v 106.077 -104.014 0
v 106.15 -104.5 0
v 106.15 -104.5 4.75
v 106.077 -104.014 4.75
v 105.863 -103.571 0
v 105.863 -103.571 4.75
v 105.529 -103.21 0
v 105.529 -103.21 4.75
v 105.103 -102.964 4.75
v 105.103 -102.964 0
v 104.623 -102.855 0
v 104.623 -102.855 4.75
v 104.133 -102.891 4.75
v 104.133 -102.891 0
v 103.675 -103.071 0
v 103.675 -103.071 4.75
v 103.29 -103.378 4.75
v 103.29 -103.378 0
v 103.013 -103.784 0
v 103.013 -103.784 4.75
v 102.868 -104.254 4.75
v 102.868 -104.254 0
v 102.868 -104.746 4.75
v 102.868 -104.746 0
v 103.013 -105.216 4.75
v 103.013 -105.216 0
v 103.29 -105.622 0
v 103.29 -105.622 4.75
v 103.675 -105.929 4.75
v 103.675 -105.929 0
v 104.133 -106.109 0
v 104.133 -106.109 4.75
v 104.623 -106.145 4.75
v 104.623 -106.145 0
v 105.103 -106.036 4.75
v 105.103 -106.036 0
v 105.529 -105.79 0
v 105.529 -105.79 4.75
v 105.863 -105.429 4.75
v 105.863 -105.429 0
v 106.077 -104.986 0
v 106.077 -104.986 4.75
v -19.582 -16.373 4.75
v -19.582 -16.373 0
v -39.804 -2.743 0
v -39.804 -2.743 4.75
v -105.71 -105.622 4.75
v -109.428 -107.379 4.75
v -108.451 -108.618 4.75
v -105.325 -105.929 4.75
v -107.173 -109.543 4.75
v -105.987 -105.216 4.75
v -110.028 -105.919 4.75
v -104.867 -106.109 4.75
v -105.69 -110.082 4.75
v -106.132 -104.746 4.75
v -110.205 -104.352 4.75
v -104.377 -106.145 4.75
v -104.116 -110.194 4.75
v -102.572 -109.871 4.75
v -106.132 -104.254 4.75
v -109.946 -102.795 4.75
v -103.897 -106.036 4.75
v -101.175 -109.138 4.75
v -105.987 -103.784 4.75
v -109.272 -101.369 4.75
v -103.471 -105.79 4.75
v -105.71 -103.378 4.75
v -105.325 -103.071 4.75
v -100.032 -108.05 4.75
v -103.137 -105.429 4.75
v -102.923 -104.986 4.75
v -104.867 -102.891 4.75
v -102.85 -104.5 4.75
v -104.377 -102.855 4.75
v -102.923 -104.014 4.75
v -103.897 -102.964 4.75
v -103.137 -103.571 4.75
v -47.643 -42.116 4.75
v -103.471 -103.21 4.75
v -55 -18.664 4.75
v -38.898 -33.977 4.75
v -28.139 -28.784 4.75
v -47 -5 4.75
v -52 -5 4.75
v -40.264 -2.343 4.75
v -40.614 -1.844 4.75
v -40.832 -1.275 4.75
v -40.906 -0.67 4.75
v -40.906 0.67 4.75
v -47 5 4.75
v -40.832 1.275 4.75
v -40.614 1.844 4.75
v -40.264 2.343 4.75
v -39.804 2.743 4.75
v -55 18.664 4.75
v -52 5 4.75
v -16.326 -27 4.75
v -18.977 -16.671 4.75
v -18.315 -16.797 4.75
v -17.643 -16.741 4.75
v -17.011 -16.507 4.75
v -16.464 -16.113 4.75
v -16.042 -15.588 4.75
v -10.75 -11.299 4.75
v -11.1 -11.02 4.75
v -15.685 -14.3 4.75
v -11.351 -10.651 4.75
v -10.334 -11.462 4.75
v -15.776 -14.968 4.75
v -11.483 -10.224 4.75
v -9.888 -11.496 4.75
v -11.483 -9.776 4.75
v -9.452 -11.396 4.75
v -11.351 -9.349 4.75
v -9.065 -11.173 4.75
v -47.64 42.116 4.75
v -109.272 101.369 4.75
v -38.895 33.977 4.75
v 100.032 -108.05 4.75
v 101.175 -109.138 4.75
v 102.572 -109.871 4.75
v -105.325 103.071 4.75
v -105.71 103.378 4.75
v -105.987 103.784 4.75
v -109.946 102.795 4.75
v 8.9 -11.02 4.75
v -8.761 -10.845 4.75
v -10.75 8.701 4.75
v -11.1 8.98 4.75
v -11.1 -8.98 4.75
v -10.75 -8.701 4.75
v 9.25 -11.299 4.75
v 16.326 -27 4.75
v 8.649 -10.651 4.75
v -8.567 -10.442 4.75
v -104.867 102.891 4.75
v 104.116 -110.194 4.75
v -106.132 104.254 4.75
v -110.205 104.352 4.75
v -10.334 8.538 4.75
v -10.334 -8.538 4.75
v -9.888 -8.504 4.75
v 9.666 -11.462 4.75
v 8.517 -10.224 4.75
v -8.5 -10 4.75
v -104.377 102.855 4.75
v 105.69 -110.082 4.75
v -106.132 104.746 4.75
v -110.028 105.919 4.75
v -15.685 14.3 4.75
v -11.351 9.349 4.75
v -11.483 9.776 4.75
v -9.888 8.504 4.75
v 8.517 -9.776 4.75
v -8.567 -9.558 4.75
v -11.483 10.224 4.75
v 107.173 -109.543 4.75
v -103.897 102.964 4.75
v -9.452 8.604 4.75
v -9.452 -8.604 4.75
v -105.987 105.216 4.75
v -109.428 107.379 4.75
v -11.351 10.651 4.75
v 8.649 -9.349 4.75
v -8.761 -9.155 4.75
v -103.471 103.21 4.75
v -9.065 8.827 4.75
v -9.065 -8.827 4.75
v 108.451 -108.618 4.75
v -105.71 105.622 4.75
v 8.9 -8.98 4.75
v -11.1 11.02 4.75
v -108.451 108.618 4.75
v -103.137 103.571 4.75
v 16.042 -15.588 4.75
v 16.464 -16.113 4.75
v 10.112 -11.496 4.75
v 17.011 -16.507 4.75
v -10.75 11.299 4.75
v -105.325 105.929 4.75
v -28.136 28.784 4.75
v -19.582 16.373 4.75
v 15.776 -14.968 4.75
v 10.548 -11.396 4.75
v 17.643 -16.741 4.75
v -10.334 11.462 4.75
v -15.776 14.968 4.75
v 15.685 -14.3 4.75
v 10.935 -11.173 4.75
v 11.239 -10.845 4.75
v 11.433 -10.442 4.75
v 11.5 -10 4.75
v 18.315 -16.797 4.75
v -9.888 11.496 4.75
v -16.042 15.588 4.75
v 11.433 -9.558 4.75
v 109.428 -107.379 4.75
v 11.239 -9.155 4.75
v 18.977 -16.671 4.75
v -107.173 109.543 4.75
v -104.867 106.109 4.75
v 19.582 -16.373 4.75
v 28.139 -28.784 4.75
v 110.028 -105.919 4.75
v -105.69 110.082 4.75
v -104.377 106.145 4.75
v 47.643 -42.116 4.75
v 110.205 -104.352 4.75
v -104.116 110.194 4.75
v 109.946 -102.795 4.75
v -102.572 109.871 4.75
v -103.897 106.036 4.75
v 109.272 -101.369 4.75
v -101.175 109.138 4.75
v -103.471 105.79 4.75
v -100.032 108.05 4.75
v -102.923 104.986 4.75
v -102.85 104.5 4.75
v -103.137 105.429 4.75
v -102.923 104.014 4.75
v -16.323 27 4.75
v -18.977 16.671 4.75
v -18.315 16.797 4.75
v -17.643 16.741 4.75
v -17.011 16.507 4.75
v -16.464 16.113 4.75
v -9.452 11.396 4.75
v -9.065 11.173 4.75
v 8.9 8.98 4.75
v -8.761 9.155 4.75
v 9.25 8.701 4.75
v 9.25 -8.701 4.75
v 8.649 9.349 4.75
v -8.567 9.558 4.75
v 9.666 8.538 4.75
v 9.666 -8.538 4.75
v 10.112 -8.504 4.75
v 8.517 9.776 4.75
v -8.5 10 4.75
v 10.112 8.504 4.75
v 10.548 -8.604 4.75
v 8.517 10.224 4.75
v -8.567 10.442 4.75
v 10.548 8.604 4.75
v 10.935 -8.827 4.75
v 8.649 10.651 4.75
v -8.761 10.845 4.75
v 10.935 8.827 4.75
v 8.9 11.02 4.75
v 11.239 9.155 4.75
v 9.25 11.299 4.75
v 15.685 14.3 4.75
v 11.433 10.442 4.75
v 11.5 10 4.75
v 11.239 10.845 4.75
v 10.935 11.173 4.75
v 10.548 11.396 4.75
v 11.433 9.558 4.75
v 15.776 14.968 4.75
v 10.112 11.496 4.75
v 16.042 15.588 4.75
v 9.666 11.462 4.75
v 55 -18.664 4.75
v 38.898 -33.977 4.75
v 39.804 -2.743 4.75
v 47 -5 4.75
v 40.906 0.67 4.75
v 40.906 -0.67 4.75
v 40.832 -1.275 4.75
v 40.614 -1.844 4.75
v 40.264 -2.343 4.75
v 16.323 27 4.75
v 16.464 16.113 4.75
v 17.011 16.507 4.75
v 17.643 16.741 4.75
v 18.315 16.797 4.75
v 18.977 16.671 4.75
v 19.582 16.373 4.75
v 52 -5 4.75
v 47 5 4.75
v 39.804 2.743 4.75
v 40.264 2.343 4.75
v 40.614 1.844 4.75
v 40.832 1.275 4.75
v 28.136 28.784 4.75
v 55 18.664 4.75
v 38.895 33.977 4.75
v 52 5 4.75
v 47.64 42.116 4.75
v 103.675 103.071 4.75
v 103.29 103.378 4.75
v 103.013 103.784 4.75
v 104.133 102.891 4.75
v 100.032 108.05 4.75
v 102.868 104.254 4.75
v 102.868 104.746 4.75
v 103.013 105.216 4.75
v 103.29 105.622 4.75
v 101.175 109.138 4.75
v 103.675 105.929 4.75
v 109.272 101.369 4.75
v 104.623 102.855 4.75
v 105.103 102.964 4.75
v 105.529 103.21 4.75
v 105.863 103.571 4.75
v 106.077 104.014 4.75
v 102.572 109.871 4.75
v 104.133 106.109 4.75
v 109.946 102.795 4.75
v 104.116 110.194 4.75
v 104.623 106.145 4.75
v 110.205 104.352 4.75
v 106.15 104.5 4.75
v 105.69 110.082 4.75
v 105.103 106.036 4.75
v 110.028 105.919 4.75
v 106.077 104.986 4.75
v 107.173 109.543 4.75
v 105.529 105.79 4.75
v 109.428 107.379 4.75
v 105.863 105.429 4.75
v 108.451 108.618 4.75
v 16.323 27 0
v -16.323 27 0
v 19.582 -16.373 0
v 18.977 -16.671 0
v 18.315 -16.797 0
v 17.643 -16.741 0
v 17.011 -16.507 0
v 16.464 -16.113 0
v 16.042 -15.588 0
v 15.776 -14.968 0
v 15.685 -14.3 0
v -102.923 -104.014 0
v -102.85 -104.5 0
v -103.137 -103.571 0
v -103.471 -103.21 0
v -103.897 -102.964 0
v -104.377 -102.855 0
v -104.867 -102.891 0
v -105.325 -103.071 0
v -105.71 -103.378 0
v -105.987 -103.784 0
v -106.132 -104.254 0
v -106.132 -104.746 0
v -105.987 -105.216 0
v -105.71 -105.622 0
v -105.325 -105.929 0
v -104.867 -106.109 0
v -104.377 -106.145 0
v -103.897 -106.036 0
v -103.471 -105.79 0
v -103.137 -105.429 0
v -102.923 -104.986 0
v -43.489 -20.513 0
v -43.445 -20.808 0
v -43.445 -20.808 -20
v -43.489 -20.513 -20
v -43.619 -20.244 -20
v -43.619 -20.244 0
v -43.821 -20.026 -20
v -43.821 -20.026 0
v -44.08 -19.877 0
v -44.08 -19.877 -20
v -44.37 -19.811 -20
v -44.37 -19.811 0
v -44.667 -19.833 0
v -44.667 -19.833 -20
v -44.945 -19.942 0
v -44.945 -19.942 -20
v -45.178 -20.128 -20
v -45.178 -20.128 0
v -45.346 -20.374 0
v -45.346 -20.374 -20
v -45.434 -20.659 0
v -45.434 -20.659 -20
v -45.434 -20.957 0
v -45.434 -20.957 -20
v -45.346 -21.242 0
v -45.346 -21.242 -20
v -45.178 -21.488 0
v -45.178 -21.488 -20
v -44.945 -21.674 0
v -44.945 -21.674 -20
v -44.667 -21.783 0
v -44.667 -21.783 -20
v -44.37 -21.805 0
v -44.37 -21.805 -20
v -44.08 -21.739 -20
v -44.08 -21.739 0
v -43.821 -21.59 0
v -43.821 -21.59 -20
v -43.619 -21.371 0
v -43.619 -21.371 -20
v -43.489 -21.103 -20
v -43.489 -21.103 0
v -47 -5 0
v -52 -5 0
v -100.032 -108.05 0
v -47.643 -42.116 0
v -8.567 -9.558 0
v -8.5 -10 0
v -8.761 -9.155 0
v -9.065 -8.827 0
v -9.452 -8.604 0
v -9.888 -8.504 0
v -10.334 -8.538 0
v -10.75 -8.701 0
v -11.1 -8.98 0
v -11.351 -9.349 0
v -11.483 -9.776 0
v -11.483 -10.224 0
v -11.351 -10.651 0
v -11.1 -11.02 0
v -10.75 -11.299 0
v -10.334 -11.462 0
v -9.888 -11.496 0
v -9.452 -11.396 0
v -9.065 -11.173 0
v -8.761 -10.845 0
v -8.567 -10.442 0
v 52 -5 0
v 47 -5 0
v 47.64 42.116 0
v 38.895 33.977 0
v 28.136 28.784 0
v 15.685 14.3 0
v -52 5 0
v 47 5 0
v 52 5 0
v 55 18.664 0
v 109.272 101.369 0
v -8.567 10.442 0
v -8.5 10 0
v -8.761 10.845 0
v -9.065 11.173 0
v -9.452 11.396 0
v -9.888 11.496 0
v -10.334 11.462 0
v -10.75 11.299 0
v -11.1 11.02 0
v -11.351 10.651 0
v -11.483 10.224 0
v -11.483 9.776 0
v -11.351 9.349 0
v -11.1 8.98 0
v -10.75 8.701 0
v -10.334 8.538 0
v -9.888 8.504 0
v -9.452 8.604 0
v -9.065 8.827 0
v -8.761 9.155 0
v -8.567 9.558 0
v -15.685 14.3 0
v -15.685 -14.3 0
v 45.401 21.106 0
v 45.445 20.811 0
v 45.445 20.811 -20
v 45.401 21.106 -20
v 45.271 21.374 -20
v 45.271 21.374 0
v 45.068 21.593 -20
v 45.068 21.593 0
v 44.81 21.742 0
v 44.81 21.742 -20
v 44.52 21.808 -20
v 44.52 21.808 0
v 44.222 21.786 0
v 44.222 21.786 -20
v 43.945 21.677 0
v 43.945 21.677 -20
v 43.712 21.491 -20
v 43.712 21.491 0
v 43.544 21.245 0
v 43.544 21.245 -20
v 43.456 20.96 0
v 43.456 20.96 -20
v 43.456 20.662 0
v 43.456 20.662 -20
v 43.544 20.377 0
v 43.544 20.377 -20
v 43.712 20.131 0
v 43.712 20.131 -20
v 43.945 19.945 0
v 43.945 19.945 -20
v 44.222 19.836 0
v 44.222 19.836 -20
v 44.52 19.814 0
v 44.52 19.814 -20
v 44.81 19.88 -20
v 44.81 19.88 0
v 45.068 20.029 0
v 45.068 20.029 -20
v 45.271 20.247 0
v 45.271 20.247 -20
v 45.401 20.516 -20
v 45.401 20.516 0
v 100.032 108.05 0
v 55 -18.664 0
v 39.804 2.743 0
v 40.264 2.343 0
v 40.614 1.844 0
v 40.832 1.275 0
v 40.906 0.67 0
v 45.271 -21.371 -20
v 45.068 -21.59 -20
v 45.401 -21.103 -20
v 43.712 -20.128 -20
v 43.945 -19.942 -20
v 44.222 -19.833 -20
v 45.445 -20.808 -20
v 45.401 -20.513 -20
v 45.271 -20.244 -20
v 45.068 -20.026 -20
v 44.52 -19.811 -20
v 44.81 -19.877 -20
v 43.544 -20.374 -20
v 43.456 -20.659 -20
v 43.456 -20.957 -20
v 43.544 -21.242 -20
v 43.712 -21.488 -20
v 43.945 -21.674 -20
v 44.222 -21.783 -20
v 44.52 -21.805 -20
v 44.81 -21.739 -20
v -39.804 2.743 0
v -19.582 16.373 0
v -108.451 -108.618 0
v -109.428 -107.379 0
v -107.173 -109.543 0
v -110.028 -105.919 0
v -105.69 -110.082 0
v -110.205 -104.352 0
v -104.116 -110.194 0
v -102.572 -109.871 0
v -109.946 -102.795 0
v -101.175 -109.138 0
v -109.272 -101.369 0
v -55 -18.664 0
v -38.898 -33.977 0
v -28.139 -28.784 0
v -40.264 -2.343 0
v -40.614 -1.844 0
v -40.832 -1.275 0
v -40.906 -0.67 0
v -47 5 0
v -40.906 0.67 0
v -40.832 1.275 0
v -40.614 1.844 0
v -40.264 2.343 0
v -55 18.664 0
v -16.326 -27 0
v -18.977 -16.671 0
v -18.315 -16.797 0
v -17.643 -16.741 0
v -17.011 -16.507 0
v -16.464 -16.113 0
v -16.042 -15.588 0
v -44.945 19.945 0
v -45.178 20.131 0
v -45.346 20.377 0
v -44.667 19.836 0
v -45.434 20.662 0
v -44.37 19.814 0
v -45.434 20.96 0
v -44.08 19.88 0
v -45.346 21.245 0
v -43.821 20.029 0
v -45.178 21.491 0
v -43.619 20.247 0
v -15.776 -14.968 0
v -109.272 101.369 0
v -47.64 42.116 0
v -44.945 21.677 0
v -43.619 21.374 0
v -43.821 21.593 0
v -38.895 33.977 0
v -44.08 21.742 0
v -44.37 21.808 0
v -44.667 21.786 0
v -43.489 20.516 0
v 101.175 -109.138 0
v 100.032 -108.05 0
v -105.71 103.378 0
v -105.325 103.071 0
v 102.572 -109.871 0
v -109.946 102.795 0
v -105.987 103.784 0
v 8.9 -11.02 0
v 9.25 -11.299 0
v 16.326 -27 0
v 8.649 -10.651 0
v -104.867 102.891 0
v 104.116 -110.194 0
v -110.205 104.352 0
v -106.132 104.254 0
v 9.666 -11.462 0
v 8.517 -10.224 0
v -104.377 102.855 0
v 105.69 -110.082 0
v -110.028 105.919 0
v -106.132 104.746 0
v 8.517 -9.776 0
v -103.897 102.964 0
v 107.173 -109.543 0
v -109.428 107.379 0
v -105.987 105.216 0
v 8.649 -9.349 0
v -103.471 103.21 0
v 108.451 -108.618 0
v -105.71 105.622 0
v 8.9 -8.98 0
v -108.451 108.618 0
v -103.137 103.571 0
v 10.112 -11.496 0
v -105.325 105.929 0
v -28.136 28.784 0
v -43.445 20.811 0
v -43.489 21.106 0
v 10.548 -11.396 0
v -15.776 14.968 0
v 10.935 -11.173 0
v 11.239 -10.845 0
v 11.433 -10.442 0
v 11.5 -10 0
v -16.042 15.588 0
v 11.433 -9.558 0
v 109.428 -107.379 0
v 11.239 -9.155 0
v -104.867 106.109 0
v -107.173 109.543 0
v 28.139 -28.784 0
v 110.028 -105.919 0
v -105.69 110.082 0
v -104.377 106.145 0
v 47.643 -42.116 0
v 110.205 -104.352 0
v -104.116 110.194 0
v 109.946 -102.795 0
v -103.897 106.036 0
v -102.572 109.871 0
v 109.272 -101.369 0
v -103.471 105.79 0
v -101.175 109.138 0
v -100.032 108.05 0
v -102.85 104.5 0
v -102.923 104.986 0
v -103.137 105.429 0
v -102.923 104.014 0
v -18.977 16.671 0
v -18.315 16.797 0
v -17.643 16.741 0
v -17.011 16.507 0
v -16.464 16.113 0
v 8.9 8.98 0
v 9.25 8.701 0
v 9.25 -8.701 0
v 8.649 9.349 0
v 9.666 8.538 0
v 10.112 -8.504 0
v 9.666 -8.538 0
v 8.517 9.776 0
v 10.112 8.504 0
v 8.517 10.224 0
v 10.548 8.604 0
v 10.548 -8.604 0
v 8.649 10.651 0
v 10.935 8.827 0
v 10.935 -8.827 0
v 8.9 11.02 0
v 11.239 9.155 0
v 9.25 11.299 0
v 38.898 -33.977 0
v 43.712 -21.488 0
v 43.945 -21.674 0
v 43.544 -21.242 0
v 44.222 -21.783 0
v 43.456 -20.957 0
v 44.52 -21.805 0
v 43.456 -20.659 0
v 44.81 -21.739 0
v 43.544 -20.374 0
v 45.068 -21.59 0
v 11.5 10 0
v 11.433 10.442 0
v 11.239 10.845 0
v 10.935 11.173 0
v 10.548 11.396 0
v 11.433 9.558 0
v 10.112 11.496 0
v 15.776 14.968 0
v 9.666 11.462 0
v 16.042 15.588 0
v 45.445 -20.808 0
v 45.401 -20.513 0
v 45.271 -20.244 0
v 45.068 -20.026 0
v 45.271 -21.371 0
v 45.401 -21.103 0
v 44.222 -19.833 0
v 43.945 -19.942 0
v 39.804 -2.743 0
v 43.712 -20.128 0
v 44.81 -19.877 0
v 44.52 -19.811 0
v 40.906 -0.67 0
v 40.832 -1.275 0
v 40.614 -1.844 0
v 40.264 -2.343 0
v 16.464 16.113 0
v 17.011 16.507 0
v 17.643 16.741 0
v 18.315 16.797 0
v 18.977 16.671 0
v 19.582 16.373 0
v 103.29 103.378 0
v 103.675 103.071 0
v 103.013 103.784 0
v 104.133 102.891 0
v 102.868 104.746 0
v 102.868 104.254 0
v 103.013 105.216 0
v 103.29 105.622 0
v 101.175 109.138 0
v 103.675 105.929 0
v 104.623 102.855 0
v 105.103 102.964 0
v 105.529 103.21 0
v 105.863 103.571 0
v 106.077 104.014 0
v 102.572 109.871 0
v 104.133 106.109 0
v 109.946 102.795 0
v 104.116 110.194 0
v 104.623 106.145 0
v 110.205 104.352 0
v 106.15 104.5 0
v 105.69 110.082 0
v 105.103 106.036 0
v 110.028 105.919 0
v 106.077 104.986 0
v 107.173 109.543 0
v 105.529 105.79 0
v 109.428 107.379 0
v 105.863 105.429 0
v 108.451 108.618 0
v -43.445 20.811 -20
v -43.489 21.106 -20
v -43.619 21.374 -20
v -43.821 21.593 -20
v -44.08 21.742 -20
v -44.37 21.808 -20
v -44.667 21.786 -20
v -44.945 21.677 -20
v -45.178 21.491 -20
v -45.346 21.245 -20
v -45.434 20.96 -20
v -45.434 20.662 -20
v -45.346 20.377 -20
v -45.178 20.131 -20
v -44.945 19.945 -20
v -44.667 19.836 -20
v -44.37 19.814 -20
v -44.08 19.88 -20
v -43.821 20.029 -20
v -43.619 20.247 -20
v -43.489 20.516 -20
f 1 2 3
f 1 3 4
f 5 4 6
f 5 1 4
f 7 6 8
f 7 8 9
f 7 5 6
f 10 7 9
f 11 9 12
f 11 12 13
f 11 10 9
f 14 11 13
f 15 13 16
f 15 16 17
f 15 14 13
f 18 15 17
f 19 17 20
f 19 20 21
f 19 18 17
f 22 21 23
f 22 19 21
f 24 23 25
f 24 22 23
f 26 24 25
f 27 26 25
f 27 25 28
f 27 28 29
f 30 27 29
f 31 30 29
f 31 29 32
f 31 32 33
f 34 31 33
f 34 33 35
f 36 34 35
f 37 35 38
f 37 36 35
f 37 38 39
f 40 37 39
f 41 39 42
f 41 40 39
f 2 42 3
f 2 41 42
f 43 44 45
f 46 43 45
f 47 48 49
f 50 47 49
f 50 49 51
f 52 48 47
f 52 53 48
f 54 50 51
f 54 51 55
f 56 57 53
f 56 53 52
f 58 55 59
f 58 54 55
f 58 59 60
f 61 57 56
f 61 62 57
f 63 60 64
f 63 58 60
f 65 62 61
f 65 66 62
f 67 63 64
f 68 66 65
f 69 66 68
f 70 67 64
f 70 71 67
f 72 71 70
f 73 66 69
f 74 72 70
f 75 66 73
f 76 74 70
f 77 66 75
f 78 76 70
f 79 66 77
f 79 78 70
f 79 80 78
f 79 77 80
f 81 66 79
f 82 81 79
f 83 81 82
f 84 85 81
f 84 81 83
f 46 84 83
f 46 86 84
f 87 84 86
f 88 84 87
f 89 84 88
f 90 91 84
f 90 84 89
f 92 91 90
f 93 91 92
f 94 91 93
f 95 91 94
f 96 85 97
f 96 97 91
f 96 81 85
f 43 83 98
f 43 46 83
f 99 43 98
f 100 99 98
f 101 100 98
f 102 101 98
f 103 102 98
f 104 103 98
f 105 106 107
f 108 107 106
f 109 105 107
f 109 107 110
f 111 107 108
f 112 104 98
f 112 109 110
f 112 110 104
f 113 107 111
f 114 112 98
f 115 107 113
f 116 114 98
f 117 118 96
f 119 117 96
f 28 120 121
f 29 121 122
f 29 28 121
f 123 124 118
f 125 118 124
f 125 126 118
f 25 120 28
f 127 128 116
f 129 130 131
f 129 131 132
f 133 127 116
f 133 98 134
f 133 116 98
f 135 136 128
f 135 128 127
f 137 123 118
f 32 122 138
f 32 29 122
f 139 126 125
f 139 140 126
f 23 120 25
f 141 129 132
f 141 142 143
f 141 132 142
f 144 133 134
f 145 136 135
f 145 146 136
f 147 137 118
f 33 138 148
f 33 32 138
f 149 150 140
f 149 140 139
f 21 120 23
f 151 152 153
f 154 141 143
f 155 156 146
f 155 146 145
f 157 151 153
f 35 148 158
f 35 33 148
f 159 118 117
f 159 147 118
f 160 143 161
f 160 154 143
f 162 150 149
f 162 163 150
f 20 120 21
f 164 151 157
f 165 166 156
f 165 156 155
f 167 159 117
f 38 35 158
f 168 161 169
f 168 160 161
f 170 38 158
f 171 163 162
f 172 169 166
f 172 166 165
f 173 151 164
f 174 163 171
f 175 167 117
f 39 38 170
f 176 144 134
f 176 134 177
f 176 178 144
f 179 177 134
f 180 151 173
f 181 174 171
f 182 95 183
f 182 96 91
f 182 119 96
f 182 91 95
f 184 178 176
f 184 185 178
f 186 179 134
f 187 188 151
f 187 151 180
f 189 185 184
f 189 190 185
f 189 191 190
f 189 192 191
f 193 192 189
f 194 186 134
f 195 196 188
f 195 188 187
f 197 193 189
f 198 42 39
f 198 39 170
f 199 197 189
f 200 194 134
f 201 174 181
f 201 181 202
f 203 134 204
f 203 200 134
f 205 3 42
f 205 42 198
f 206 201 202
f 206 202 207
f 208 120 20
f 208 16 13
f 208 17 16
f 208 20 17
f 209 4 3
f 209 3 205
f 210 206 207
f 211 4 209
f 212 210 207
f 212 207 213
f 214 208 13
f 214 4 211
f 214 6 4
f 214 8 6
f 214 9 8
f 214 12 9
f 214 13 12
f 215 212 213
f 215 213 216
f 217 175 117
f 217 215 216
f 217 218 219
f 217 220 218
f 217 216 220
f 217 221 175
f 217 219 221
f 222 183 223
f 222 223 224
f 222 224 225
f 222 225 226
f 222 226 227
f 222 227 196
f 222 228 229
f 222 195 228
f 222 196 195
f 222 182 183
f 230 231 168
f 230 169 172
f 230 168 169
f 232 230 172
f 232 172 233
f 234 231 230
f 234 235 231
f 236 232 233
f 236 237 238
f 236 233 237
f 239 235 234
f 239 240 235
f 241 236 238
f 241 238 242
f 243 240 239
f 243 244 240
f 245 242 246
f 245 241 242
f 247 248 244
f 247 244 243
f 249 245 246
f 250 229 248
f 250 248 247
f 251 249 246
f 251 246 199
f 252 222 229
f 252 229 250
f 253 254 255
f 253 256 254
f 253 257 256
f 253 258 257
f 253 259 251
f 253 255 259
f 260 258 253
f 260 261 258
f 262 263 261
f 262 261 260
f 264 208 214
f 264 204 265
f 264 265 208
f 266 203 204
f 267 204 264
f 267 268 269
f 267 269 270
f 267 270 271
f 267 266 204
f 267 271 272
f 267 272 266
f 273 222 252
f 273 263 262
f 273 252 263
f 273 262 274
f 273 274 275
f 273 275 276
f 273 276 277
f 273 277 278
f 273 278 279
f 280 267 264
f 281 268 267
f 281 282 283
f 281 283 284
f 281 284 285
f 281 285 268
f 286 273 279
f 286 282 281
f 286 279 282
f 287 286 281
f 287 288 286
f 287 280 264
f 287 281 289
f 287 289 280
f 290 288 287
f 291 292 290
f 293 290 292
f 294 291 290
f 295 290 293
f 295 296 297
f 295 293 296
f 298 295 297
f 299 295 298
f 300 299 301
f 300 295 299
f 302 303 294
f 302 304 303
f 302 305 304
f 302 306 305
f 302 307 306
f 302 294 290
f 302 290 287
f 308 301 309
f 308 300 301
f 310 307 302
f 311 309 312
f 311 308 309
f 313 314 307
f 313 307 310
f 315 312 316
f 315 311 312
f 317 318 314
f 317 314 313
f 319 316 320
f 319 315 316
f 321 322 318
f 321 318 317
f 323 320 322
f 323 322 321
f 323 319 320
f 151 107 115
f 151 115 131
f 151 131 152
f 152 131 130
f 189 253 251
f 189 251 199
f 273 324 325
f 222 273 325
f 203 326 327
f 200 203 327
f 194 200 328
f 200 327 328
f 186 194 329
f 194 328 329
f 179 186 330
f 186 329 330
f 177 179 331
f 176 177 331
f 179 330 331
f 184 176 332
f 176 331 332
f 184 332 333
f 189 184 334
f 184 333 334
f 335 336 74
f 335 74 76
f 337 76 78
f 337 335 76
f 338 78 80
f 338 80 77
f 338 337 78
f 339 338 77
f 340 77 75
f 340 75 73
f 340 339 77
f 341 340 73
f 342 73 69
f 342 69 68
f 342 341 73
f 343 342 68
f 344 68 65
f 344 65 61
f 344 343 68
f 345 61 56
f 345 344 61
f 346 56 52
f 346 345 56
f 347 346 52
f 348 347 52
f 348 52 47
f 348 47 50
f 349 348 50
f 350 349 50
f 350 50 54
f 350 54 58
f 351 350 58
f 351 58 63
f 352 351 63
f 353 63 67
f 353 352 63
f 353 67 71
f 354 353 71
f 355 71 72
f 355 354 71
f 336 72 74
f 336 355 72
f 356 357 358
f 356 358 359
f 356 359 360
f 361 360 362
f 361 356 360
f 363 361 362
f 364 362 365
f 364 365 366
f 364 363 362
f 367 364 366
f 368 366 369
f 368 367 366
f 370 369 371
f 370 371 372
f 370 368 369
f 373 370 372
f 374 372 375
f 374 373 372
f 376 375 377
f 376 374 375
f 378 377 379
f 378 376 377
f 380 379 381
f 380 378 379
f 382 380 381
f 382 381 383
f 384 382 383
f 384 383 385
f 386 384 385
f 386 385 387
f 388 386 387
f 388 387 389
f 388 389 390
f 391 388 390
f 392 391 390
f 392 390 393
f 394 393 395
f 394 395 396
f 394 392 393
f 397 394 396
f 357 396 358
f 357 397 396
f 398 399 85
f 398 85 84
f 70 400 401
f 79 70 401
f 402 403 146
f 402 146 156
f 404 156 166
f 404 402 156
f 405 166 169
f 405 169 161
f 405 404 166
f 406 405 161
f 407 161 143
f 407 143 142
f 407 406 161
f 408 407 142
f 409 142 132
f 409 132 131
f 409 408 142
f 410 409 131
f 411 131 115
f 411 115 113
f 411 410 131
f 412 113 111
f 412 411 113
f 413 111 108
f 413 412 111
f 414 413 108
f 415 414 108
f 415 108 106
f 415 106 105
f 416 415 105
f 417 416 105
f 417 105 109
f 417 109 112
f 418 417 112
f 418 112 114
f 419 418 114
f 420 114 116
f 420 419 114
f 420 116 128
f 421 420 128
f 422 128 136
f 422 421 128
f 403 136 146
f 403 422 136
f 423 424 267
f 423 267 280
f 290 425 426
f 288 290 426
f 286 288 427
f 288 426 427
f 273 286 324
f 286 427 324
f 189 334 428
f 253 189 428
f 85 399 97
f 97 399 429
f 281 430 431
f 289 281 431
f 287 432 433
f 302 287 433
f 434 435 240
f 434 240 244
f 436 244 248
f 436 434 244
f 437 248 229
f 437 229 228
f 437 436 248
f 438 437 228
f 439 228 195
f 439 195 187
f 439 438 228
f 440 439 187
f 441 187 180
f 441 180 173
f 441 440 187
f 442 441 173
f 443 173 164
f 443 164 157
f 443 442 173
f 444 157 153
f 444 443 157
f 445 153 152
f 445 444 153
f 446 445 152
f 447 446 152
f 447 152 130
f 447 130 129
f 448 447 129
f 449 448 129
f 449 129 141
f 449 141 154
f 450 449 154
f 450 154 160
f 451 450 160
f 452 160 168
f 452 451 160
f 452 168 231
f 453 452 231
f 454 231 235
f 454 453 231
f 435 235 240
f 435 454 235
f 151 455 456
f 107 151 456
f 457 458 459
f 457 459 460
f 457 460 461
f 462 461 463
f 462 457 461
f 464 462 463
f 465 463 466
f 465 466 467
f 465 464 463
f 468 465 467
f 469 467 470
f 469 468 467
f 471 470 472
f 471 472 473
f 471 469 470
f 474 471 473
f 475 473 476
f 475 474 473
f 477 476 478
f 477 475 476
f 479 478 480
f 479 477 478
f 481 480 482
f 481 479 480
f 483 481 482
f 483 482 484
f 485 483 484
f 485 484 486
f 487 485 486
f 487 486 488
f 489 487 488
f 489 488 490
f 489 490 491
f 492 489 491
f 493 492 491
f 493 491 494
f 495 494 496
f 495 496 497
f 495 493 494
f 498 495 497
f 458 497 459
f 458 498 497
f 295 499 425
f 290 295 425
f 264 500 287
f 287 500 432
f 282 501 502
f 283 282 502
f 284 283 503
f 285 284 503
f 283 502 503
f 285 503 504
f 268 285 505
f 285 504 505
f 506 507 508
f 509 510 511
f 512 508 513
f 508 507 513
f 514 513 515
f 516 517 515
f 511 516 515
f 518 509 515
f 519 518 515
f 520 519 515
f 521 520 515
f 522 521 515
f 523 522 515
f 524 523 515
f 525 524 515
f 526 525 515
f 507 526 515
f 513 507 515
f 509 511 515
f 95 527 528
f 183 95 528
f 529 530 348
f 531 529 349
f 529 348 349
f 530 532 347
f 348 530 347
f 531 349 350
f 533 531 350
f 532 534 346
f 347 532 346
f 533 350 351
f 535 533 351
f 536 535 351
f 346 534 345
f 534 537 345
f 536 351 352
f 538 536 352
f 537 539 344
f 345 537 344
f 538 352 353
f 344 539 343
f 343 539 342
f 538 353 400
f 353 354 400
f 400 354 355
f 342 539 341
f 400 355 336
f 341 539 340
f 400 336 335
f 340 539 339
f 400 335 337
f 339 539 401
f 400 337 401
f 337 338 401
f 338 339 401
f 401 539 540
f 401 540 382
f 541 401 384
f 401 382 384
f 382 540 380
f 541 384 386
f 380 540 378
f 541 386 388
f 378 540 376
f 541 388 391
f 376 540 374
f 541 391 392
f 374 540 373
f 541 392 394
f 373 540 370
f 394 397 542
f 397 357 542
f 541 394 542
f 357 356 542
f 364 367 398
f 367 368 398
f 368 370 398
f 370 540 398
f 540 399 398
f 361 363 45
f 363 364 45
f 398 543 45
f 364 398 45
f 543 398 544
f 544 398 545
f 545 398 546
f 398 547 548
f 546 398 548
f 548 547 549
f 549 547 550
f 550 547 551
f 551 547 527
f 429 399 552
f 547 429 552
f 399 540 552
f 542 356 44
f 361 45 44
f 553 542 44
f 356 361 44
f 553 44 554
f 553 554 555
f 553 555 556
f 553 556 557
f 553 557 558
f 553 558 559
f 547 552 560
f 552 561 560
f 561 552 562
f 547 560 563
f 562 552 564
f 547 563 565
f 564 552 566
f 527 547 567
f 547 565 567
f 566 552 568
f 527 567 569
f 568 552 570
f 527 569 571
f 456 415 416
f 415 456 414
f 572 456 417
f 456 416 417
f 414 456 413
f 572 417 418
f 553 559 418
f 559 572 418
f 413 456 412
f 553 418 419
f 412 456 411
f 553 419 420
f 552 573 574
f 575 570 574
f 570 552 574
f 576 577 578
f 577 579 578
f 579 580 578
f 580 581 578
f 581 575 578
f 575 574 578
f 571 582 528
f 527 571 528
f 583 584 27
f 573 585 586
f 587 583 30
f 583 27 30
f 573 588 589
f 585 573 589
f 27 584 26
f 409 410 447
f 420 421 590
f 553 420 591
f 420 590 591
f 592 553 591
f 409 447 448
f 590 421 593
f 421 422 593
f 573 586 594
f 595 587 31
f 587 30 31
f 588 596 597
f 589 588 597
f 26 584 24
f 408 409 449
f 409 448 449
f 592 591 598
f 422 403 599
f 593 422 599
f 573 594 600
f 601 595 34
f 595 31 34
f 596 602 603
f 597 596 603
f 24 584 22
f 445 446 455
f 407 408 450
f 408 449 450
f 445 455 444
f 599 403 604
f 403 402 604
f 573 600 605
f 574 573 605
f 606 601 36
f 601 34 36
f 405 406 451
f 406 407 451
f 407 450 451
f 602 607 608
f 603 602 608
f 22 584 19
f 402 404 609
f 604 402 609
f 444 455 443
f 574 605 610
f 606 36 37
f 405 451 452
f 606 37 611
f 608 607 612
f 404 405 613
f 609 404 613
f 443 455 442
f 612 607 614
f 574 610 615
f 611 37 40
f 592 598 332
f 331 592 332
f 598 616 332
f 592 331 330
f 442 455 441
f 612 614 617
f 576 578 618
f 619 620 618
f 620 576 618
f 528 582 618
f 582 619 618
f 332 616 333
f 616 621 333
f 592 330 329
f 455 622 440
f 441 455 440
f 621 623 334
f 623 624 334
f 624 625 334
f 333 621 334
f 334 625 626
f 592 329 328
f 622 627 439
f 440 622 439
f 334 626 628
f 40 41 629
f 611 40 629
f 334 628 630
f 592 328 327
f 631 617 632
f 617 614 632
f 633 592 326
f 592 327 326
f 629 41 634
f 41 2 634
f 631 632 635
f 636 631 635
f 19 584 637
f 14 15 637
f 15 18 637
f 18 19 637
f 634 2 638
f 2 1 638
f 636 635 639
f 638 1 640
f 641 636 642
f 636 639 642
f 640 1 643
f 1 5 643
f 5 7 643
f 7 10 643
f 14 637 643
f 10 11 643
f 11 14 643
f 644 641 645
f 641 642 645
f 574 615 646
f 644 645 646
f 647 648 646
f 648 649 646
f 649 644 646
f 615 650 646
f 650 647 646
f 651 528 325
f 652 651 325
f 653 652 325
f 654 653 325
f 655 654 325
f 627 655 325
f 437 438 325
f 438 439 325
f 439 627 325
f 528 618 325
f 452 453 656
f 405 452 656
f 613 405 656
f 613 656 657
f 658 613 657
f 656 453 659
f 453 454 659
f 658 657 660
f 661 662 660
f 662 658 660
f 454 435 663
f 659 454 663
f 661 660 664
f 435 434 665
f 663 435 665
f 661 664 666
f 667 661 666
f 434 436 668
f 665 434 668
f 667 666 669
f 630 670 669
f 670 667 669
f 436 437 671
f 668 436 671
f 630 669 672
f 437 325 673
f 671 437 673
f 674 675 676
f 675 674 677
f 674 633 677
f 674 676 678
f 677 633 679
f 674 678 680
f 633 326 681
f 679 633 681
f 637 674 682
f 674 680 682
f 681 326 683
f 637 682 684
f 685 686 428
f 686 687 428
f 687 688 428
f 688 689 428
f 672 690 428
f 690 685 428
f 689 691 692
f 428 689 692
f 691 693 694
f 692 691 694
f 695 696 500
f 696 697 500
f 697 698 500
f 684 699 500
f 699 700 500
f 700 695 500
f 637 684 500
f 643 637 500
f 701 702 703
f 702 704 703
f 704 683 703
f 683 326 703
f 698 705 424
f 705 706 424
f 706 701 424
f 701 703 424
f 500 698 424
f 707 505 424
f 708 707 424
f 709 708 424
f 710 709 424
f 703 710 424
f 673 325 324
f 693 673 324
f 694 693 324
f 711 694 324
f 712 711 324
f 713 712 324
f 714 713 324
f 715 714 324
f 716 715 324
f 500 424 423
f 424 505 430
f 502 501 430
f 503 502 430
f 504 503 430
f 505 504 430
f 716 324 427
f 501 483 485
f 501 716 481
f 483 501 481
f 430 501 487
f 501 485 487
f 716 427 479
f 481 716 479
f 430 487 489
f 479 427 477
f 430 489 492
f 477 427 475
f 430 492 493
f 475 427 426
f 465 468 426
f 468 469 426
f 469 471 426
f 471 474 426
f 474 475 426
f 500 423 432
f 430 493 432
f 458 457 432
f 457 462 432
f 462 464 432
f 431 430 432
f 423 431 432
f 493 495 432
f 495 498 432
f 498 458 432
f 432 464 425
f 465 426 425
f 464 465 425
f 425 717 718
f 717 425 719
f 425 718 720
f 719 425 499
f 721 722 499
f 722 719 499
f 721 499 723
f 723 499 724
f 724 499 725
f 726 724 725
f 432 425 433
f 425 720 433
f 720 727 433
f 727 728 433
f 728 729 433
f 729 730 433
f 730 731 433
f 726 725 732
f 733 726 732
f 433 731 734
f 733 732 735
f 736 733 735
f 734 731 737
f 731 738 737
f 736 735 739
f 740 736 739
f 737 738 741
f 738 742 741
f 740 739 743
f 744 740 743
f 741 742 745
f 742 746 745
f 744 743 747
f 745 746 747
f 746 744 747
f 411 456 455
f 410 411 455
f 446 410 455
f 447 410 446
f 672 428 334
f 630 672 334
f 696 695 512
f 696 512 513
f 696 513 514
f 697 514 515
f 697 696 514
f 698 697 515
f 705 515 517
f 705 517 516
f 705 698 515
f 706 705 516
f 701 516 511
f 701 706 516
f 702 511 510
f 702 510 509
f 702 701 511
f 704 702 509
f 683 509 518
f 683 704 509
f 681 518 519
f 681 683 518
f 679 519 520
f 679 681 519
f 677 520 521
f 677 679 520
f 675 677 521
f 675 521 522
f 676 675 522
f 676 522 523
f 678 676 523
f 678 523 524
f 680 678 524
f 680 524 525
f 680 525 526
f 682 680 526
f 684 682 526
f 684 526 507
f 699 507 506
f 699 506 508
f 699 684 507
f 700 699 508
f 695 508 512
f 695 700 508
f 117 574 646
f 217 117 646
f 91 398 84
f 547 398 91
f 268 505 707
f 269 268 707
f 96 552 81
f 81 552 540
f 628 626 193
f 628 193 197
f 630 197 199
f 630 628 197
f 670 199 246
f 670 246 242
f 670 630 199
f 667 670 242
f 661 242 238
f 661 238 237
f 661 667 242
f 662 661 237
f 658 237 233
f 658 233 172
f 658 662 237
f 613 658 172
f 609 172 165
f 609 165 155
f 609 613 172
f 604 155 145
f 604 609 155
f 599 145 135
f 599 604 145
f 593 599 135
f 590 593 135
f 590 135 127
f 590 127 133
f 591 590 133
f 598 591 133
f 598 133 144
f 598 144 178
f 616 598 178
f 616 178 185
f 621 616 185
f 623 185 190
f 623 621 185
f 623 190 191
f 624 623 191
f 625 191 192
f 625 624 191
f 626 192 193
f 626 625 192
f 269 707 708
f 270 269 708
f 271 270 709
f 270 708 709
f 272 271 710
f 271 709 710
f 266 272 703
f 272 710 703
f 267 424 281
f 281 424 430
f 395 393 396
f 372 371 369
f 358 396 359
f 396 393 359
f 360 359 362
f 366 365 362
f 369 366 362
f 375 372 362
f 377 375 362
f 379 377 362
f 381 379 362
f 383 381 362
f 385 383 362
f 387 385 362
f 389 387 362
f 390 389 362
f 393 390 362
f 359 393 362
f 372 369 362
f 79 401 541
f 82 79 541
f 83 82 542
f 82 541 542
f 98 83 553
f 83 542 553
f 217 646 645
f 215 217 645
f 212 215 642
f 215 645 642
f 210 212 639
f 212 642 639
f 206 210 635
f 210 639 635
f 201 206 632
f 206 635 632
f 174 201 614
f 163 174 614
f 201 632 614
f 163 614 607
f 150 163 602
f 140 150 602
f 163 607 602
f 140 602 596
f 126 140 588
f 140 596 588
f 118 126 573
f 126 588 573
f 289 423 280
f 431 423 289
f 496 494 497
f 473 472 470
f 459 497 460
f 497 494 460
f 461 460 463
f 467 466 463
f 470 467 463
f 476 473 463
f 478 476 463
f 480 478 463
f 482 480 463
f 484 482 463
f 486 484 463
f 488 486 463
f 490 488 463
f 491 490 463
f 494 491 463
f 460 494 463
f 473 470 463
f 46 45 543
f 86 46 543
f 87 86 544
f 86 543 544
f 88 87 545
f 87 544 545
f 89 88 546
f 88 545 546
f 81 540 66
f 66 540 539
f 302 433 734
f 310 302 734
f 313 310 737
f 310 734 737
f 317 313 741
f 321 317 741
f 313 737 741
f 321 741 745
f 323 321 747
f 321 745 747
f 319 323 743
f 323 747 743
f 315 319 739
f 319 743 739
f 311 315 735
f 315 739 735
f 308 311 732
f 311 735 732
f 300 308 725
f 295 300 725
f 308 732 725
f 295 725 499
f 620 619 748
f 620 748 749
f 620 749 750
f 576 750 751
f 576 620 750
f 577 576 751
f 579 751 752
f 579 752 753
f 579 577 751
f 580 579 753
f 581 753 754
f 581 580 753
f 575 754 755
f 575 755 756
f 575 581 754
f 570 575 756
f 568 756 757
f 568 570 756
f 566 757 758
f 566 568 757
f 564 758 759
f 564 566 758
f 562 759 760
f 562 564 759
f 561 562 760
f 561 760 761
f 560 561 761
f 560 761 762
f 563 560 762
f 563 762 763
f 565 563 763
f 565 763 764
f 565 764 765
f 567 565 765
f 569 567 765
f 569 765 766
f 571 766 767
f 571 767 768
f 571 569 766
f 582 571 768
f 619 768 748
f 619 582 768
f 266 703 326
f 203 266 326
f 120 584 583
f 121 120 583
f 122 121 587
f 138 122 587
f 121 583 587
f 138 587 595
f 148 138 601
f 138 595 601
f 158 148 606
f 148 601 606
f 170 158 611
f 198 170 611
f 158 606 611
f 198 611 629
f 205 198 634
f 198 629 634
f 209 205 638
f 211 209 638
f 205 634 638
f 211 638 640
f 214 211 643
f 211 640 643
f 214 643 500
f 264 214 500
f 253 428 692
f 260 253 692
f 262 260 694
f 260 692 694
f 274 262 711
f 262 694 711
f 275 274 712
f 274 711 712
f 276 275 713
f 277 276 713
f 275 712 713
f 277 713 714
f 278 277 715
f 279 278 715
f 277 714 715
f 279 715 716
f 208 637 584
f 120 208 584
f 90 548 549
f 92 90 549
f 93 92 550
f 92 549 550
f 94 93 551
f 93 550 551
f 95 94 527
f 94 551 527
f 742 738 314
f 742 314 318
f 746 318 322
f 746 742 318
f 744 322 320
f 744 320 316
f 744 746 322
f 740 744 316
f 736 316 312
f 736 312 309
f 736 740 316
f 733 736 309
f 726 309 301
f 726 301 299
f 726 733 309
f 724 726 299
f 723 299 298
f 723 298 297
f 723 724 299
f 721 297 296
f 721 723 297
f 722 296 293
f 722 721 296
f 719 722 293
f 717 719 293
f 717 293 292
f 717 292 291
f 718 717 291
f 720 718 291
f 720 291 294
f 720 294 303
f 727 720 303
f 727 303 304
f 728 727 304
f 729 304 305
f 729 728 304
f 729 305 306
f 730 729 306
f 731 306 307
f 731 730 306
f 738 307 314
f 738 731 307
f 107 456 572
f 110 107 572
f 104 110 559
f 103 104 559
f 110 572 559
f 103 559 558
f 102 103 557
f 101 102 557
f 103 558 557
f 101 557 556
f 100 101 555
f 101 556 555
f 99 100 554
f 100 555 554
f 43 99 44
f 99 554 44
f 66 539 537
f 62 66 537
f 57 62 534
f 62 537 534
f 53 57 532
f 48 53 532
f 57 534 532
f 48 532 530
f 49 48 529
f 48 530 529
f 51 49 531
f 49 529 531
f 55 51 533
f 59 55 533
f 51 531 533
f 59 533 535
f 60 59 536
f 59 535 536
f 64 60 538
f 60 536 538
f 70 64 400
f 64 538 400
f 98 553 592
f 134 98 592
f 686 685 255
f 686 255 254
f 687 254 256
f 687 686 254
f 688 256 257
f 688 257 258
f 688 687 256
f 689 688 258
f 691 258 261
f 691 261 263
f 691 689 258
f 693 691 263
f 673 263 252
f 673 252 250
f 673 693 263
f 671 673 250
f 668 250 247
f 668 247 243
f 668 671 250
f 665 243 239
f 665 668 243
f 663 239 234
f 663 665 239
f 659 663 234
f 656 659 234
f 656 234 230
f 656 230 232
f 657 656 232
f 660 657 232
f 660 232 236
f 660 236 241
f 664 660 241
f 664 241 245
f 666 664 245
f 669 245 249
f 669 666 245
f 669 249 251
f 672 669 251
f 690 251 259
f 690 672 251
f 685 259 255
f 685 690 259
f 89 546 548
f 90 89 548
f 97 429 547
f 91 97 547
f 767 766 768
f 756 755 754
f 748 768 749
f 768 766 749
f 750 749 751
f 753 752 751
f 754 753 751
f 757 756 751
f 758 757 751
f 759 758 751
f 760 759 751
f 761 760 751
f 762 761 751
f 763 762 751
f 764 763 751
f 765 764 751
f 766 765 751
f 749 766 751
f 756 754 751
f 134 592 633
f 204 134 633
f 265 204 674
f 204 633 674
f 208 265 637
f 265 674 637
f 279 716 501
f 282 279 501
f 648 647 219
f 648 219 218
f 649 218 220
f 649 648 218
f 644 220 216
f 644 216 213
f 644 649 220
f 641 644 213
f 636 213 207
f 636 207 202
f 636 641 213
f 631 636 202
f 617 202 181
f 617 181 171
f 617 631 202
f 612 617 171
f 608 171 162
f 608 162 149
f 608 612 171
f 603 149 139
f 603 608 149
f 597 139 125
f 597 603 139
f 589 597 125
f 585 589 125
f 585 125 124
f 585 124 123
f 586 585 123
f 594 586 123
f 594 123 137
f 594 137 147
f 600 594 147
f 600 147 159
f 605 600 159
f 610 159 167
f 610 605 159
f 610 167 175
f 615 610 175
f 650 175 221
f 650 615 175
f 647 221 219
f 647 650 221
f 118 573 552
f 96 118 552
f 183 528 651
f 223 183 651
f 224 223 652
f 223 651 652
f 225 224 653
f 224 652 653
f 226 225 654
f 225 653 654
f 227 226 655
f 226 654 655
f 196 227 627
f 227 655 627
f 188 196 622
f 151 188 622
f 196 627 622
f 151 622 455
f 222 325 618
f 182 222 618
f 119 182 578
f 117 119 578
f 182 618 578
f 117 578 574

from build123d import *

# Parameters (mm, degrees)
F0_R     = 1.65
F0_R_2   = 2.55
F0_W     = 5
F0_H     = 10
F0_R_3   = 1.5
F0_R_4   = 3.555
F1_DEPTH = 4.75
F2_R     = 1
F3_DEPTH = 20
F4_R     = 3.555
F4_R_2   = 2.55
F5_DEPTH = 4.75


# Not quite as in the source:
# - ends of sketch curves that miss each other by under 0.0002 mm in the source are joined


with BuildPart() as f1:
    # F0 (on Top) → F1 (new body)
    with BuildSketch(Plane.XY):
        with BuildLine():
            Line((-47.640397, 42.115595), (-100.031737, 108.050449))
            ThreePointArc((-100.031737, 108.050449), (-107.8442155419, 109.1246397394), (-109.2715048598, 101.368896092))
            Line((-109.2715048598, 101.368896092), (-54.999977, 18.664241))
            Line((-54.999977, 18.664241), (-54.999977, -18.664242))
            Line((-54.999977, -18.664242), (-109.271505, -101.368897))
            ThreePointArc((-109.271505, -101.368897), (-107.8441644553, -109.1246766812), (-100.031658534, -108.0503513703))
            Line((-100.031658534, -108.0503513703), (-47.643302, -42.116283))
            ThreePointArc((-47.643302, -42.116283), (-33.7130803066, -30.9767526972), (-16.325566, -27))
            Line((-16.325566, -27), (16.325565, -27))
            ThreePointArc((16.325565, -27), (33.7130793066, -30.9767526972), (47.6433013924, -42.1162826882))
            Line((47.6433013924, -42.1162826882), (100.031658, -108.050351))
            ThreePointArc((100.031658, -108.050351), (107.8441644255, -109.1246767027), (109.2715050175, -101.3688963323))
            Line((109.2715050175, -101.3688963323), (54.999976, -18.664242))
            Line((54.999976, -18.664242), (54.999976, 18.664241))
            Line((54.999976, 18.664241), (109.271504, 101.368896))
            ThreePointArc((109.271504, 101.368896), (107.8442155121, 109.1246397609), (100.0317360662, 108.0504489474))
            Line((100.0317360662, 108.0504489474), (47.640396, 42.115595))
            ThreePointArc((47.640396, 42.115595), (33.7103248028, 30.9765618002), (16.323206, 27))
            Line((16.323206, 27), (-16.323206, 27))
            ThreePointArc((-16.323206, 27), (-33.710325083, 30.9765619354), (-47.640397, 42.115595))
        make_face()
        with Locations((-104.5, -104.5)):
            Circle(F0_R, mode=Mode.SUBTRACT)
        with Locations((-44.444977, -20.807752)):
            Circle(F0_R_2, mode=Mode.SUBTRACT)
        with Locations((-49.499977, 0)):
            Rectangle(F0_W, F0_H, mode=Mode.SUBTRACT)
        with BuildLine():
            Line((-19.581953, -16.373154), (-39.803759, -2.743263))
            ThreePointArc((-39.803759, -2.743263), (-40.6136447533, -1.8442487652), (-40.906473, -0.670199))
            Line((-40.906473, -0.670199), (-40.906473, 0.670176))
            ThreePointArc((-40.906473, 0.670176), (-40.6136450793, 1.8442251525), (-39.8037598701, 2.7432388072))
            Line((-39.8037598701, 2.7432388072), (-19.581955, 16.373149))
            ThreePointArc((-19.581955, 16.373149), (-17.0106188475, 16.5072580793), (-15.684668, 14.300086))
            Line((-15.684668, 14.300086), (-15.684668, -14.30009))
            ThreePointArc((-15.684668, -14.30009), (-17.0106178687, -16.5072615586), (-19.581953, -16.373154))
        make_face(mode=Mode.SUBTRACT)
        with Locations((-10, -10)):
            Circle(F0_R_3, mode=Mode.SUBTRACT)
        with Locations((104.5, -104.5)):
            Circle(F0_R, mode=Mode.SUBTRACT)
        with Locations((10, -10)):
            Circle(F0_R_3, mode=Mode.SUBTRACT)
        with Locations((44.444976, -20.807752)):
            Circle(F0_R_2, mode=Mode.SUBTRACT)
        with BuildLine():
            Line((19.581954, 16.373149), (39.803759, 2.743239))
            ThreePointArc((39.803759, 2.743239), (40.6136440793, 1.8442251525), (40.906472, 0.670176))
            Line((40.906472, 0.670176), (40.906472, -0.670199))
            ThreePointArc((40.906472, -0.670199), (40.6136437533, -1.8442487652), (39.803757719, -2.7432625831))
            Line((39.803757719, -2.7432625831), (19.581952, -16.373154))
            ThreePointArc((19.581952, -16.373154), (17.0106168687, -16.5072615586), (15.684667, -14.30009))
            Line((15.684667, -14.30009), (15.684667, 14.300086))
            ThreePointArc((15.684667, 14.300086), (17.0106178475, 16.5072580793), (19.581954, 16.373149))
        make_face(mode=Mode.SUBTRACT)
        with Locations((49.499976, 0)):
            Rectangle(F0_W, F0_H, mode=Mode.SUBTRACT)
        with Locations((-44.444977, 20.810818)):
            Circle(F0_R_4, mode=Mode.SUBTRACT)
        with Locations((-10, 10)):
            Circle(F0_R_3, mode=Mode.SUBTRACT)
        with Locations((-104.5, 104.5)):
            Circle(F0_R, mode=Mode.SUBTRACT)
        with Locations((10, 10)):
            Circle(F0_R_3, mode=Mode.SUBTRACT)
        with Locations((44.444976, 20.810818)):
            Circle(F0_R_4, mode=Mode.SUBTRACT)
        with Locations((104.5, 104.5)):
            Circle(F0_R, mode=Mode.SUBTRACT)
    extrude(amount=F1_DEPTH)



with BuildPart() as f3:
    # F2 (on Top) → F3 (new body)
    with BuildSketch(Plane.XY):
        with Locations((-44.444977, 20.810818)):
            Circle(F2_R)
    extrude(amount=-F3_DEPTH)


with BuildPart() as f3b:
    # F2 (on Top) → F3, piece 2 (new body)
    with BuildSketch(Plane.XY):
        with Locations((44.444976, 20.810818)):
            Circle(F2_R)
    extrude(amount=-F3_DEPTH)


with BuildPart() as f3c:
    # F2 (on Top) → F3, piece 3 (new body)
    with BuildSketch(Plane.XY):
        with Locations((-44.444977, -20.807752)):
            Circle(F2_R)
    extrude(amount=-F3_DEPTH)


with BuildPart() as f3d:
    # F2 (on Top) → F3, piece 4 (new body)
    with BuildSketch(Plane.XY):
        with Locations((44.444976, -20.807752)):
            Circle(F2_R)
    extrude(amount=-F3_DEPTH)


with BuildPart() as f1_1:
    add(f1.part)

    add(f3.part)  # F5 merges F3

    add(f3b.part)  # F5 merges F3b

    add(f3c.part)  # F5 merges F3c

    add(f3d.part)  # F5 merges F3d
    # F4 (on face) → F5 (join)
    with BuildSketch(Plane.XY.offset(4.75)):
        with Locations((-44.444977, 20.810818)):
            Circle(F4_R)
        with Locations((-44.444977, -20.807752)):
            Circle(F4_R_2)
        with Locations((44.444976, 20.810818)):
            Circle(F4_R)
        with Locations((44.444976, -20.807752)):
            Circle(F4_R_2)
    extrude(amount=-F5_DEPTH)


solid = f1_1.part
